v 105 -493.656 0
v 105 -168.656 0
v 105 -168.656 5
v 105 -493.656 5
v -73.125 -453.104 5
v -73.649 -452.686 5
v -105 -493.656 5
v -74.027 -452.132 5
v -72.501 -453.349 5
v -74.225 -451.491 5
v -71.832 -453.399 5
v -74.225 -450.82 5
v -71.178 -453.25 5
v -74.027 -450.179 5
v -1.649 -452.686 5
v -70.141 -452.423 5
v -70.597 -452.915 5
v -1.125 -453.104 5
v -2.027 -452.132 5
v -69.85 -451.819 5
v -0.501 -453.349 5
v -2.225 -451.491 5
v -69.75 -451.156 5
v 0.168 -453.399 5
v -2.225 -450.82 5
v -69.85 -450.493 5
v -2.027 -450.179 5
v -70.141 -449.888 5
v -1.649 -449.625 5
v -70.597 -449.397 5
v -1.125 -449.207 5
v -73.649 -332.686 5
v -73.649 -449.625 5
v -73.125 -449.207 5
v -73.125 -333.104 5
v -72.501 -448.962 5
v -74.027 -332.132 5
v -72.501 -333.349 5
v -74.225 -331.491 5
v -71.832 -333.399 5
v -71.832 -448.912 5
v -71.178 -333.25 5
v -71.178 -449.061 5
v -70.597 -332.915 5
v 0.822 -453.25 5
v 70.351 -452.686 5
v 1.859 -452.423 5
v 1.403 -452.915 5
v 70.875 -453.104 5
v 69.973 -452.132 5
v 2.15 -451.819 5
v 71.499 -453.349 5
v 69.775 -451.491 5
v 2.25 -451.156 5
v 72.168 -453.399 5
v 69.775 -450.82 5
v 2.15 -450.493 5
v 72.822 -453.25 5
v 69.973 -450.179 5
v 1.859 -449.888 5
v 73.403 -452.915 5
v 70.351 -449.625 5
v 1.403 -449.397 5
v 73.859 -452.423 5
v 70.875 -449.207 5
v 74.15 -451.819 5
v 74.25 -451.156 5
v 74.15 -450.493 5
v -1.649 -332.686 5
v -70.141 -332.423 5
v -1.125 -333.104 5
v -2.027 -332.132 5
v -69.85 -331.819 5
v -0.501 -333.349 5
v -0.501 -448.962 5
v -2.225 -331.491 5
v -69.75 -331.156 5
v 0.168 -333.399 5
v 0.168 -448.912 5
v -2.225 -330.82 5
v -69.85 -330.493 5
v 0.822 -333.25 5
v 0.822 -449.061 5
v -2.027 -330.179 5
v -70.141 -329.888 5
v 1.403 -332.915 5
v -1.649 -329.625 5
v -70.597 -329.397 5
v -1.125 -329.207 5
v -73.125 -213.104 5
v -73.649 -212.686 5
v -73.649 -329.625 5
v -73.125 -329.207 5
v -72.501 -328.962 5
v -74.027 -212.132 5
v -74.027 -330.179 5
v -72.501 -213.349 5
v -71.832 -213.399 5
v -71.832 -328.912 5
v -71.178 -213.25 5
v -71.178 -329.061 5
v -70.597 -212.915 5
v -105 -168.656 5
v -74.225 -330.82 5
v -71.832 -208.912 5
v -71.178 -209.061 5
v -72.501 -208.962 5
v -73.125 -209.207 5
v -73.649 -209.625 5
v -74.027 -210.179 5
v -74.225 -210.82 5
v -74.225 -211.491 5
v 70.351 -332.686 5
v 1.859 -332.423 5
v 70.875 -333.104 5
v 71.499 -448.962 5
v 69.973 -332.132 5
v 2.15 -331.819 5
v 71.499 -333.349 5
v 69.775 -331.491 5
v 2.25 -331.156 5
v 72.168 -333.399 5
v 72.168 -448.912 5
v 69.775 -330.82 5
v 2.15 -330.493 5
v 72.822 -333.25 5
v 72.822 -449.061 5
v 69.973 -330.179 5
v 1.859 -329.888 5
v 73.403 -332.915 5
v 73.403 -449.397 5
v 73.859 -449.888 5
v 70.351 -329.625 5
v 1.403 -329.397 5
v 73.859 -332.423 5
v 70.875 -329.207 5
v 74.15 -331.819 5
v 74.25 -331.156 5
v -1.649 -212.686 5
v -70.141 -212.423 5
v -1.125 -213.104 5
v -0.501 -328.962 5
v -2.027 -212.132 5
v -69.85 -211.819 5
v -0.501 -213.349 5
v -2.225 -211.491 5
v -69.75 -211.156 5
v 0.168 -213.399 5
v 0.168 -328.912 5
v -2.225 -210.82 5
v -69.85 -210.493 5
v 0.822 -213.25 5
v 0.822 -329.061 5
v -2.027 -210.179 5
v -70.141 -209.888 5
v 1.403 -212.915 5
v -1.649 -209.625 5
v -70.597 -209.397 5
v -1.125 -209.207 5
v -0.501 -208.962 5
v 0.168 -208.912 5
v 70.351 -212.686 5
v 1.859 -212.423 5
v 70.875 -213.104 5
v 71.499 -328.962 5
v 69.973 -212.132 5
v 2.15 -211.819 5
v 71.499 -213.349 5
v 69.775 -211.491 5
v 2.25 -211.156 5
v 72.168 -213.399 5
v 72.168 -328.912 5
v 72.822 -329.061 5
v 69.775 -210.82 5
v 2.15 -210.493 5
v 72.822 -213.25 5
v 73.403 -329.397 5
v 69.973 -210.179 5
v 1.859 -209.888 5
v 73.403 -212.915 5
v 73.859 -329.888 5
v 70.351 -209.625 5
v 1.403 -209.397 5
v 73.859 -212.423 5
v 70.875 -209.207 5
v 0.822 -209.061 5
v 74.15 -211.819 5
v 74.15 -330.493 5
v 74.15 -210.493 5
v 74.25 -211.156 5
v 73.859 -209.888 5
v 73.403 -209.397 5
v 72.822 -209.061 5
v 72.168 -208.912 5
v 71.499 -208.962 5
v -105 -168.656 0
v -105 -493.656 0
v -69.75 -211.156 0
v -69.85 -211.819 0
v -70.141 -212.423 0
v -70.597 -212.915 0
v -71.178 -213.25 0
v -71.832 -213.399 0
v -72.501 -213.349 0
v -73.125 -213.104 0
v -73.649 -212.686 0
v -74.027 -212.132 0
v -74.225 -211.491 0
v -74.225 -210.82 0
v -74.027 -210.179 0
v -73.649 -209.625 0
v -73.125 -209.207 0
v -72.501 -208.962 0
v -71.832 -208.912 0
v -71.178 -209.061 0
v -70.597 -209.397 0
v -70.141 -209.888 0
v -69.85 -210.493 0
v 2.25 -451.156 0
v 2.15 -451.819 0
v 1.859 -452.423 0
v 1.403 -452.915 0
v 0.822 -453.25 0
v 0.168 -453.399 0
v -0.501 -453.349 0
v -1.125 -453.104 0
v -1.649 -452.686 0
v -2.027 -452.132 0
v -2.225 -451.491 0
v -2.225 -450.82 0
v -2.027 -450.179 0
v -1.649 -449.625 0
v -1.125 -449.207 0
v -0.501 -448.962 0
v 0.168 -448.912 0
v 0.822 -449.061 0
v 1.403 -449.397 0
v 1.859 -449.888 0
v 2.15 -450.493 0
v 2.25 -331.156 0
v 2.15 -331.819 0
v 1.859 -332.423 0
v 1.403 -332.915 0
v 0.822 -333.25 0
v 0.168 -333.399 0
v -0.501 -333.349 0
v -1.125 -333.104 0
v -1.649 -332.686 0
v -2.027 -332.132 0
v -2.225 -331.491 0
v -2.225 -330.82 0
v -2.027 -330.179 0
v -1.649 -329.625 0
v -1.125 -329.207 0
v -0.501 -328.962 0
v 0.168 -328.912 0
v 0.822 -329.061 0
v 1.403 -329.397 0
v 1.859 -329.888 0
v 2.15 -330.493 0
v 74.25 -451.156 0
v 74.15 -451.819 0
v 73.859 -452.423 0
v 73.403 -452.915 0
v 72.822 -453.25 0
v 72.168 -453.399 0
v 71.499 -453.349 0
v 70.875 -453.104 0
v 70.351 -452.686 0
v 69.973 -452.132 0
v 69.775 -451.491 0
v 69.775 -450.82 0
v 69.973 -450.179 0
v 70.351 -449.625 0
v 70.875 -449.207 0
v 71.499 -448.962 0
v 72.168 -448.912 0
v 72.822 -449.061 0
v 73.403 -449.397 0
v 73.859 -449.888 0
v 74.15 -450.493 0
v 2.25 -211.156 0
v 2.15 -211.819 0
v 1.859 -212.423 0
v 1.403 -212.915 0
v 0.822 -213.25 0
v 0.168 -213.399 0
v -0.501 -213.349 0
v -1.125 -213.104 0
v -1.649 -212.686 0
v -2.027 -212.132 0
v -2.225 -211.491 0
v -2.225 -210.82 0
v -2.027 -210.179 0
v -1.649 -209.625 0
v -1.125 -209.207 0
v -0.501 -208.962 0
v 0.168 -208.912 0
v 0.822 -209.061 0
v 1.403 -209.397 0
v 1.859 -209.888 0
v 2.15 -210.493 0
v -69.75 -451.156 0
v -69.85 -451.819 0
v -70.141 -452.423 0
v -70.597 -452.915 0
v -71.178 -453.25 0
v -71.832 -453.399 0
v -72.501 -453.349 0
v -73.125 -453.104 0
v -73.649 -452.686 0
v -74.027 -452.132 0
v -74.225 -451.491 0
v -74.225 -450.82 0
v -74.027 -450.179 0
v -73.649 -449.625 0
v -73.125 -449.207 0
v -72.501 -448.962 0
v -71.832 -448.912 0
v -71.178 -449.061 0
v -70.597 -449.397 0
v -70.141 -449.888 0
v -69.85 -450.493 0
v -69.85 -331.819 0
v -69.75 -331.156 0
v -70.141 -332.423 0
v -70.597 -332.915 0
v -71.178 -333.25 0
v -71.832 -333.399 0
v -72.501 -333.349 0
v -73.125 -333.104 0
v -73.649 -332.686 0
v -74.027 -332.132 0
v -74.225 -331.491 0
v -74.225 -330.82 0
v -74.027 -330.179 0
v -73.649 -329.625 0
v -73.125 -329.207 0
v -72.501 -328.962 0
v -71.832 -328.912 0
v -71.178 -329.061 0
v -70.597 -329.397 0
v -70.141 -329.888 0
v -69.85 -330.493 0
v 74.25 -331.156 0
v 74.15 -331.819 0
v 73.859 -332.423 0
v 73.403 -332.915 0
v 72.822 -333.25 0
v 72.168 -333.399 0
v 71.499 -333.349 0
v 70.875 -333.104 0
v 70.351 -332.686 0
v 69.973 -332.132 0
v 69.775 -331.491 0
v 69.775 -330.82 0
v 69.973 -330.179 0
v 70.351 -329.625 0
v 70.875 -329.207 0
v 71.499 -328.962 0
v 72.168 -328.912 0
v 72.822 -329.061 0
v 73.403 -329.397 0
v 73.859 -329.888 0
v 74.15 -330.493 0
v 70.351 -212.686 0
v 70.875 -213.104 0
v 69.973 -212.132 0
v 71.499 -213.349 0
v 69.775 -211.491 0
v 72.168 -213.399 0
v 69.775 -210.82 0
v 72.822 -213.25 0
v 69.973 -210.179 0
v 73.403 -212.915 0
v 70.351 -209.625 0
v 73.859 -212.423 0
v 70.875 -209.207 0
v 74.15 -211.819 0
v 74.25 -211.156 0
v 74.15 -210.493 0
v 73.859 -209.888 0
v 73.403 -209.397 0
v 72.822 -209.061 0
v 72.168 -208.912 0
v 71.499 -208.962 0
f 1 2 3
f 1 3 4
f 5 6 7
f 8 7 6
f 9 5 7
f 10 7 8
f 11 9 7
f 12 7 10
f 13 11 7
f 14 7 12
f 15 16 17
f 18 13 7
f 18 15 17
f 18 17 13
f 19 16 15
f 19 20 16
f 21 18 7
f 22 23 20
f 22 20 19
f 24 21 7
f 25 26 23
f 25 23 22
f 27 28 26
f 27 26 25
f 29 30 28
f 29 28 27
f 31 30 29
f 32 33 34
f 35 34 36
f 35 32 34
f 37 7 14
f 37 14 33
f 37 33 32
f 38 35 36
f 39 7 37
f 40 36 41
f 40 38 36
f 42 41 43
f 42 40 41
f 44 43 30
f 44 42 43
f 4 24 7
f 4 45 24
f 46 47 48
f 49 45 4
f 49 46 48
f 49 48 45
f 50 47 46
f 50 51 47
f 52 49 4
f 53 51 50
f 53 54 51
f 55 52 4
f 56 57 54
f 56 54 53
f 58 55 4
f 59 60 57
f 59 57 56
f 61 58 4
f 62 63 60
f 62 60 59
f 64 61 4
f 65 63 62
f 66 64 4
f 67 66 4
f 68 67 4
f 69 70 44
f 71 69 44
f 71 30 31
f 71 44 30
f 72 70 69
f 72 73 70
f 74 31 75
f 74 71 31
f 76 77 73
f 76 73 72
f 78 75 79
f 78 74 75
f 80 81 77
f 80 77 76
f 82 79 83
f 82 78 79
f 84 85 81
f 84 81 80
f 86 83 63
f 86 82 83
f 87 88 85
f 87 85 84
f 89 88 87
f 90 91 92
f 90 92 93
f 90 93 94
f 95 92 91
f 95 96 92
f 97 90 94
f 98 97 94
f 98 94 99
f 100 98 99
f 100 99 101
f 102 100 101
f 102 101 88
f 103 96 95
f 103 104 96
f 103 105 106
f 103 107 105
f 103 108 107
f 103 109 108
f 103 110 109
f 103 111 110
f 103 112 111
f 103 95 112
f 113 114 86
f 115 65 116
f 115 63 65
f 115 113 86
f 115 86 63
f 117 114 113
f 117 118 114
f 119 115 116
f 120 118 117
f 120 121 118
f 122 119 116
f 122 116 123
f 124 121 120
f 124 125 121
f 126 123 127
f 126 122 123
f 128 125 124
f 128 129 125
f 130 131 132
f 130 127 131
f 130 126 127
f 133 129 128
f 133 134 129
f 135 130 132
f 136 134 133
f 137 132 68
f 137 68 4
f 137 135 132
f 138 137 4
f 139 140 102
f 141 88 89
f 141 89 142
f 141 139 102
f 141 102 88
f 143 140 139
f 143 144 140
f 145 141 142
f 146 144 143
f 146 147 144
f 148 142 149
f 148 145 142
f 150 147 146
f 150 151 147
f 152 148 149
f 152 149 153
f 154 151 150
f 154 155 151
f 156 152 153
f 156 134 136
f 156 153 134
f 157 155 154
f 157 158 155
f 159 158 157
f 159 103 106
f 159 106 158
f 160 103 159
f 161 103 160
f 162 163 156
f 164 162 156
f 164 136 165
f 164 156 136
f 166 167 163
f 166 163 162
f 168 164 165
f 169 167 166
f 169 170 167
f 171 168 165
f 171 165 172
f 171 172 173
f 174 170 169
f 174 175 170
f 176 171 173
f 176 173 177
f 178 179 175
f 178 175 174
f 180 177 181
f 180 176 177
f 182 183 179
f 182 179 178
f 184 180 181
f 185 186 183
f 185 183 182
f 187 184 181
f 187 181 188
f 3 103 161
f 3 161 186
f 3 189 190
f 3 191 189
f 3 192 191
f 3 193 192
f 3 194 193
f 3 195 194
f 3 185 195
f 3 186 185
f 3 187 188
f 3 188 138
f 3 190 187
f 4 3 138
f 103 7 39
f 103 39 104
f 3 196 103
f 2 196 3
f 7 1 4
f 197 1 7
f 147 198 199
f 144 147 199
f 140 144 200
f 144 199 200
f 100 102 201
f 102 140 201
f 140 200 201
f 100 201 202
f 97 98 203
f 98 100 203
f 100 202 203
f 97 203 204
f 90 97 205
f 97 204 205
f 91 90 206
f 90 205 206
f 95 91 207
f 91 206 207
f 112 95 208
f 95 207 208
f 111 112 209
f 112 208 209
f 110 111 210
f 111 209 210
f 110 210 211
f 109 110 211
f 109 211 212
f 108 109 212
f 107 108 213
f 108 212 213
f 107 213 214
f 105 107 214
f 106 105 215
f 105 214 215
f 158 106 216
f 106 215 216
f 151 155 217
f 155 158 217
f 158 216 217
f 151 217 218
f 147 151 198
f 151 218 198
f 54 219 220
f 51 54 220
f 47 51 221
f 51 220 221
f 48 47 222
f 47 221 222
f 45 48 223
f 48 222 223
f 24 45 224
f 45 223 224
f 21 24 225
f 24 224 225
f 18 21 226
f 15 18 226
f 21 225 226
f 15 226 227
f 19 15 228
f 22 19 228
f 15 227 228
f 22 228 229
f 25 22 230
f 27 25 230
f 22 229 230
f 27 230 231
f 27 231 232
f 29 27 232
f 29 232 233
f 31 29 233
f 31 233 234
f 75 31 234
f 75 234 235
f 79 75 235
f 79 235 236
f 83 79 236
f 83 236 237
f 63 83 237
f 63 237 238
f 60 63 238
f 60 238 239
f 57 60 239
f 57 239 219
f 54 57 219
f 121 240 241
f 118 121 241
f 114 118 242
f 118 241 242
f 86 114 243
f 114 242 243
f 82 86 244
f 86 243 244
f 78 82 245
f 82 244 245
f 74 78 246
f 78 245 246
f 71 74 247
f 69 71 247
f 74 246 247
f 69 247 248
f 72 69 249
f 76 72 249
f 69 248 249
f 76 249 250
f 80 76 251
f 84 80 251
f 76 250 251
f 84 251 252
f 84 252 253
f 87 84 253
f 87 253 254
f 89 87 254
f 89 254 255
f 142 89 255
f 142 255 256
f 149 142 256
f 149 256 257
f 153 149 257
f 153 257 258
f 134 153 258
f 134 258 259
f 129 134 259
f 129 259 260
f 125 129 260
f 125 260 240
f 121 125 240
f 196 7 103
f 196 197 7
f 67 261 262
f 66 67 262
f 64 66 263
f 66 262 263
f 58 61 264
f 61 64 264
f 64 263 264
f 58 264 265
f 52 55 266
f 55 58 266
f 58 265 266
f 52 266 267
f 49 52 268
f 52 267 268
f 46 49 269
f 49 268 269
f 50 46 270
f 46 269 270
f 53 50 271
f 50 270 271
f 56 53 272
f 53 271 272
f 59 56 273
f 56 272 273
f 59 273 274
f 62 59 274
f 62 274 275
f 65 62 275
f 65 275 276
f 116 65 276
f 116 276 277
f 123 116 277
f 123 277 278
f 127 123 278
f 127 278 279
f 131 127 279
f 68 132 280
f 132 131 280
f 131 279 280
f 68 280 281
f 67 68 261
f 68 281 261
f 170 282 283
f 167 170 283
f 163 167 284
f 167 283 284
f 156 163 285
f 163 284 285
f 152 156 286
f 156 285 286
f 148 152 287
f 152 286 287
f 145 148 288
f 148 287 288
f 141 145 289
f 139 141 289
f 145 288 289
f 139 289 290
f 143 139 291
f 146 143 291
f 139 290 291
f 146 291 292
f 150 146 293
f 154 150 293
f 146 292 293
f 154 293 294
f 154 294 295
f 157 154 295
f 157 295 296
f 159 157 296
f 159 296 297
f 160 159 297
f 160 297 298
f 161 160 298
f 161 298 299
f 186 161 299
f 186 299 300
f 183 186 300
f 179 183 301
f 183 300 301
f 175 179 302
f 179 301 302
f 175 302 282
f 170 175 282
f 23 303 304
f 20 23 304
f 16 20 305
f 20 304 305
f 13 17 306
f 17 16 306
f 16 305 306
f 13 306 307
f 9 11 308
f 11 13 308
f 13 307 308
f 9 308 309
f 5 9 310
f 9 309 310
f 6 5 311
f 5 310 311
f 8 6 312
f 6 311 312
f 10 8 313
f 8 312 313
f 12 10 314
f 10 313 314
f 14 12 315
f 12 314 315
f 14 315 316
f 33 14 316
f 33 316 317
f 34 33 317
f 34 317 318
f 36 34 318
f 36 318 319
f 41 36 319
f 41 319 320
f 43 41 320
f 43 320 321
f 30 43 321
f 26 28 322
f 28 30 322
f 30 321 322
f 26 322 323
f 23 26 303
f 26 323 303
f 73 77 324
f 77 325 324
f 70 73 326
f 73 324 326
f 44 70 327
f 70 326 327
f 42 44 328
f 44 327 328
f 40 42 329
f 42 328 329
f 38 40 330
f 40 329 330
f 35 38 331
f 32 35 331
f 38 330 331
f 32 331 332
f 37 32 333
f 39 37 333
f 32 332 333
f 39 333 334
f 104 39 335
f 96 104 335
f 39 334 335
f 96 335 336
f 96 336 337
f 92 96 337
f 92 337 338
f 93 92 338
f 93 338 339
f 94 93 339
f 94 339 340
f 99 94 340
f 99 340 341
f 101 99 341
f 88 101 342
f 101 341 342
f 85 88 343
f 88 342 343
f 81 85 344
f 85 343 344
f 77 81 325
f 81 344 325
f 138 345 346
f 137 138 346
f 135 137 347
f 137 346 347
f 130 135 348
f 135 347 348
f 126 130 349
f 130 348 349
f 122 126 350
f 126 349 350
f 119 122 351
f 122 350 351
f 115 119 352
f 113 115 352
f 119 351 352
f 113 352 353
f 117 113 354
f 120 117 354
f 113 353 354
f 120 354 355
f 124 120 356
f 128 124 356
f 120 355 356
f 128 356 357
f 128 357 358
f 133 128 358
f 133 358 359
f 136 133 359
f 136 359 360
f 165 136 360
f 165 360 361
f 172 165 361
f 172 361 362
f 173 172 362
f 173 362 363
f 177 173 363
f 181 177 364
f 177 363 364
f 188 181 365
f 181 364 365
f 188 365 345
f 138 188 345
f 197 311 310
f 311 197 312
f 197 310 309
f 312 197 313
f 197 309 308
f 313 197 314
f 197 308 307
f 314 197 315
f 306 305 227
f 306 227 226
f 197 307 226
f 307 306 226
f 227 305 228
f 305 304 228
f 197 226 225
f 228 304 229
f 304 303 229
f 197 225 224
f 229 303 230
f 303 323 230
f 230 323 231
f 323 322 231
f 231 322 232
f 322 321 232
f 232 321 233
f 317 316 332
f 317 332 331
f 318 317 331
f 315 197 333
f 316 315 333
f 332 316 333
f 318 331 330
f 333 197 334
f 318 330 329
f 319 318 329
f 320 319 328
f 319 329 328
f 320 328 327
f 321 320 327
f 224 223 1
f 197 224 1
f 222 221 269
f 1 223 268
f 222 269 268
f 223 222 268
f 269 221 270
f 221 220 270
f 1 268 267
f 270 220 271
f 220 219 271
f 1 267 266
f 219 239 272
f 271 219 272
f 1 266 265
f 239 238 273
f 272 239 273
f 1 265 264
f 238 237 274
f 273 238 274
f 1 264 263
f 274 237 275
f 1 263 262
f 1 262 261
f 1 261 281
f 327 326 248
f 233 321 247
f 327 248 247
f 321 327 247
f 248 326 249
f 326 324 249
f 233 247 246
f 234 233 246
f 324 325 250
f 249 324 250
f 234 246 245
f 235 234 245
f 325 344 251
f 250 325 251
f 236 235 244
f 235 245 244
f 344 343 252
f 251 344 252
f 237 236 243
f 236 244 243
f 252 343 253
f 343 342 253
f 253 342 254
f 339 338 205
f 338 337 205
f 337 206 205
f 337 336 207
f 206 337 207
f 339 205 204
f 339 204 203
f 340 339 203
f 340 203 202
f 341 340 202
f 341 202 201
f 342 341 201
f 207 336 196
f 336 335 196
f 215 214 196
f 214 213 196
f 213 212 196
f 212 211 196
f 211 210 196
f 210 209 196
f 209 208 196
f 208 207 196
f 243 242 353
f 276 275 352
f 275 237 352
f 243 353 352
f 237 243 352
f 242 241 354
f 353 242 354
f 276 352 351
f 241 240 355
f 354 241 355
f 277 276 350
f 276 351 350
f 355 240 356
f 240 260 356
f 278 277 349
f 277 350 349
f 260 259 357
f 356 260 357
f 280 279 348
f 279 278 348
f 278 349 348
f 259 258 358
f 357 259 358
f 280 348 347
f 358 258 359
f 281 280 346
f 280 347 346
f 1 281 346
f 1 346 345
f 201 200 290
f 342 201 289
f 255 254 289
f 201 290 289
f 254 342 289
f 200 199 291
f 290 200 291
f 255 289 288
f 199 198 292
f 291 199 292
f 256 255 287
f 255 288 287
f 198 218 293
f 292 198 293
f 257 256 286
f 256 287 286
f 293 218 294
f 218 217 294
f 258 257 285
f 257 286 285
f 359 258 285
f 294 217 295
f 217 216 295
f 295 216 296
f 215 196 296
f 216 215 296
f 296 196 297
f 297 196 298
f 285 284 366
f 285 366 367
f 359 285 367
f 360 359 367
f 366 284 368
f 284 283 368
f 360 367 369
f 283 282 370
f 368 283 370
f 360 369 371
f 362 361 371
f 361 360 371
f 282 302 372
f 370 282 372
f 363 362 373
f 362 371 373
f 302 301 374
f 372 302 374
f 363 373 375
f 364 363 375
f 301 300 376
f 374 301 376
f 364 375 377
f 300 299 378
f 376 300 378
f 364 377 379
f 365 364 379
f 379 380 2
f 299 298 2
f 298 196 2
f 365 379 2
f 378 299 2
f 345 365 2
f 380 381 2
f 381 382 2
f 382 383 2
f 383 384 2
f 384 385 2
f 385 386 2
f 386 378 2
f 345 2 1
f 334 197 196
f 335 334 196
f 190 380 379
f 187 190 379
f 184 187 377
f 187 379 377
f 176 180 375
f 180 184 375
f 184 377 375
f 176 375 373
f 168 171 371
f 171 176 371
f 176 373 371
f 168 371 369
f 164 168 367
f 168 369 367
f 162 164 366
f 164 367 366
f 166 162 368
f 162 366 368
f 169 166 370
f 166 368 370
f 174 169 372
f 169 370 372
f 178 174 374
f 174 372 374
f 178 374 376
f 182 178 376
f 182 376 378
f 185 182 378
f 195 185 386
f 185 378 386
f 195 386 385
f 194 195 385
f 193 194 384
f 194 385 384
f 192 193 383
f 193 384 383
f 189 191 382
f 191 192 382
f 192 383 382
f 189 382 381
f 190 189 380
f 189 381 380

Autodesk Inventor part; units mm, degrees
ref_plane "YZ Plane" through (0, 0, 0) normal (1, 0, 0) x (0, 1, 0)
ref_plane "XZ Plane" through (0, 0, 0) normal (0, 1, 0) x (-1, 0, 0)
ref_plane "XY Plane" through (0, 0, 0) normal (0, 0, 1) x (1, 0, 0)
ref_plane "作業平面1" through (0, 0, 0) normal (0, 0, 1) x (1, 0, 0)
sketch "スケッチ1" plane through (0, 0, 0) normal (0, 0, 1) x (1, 0, 0)
  line L0 (0, -891.1557) -> (0, 228.8443)
  line L1 (-147, -331.1557) -> (147, -331.1557)
  circle A0 centre (72, -331.1557) radius 2.25 projected
  circle A1 centre (-72, -211.1557) radius 2.25 projected
  circle A2 centre (0, -451.1557) radius 2.25 projected
  circle A3 centre (-72, -331.1557) radius 2.25 projected
  circle A4 centre (0, -331.1557) radius 2.25 projected
  circle A5 centre (-72, -451.1557) radius 2.25 projected
  circle A6 centre (0, -211.1557) radius 2.25 projected
  circle A7 centre (72, -451.1557) radius 2.25 projected
  circle A8 centre (72, -211.1557) radius 2.25 projected
  circle A9 centre (20.5, -135.3359) radius 2.75 projected
  circle A10 centre (20.5, -72.3359) radius 2.75 projected
  circle A11 centre (-20.5, -585.3359) radius 2.75 projected
  circle A12 centre (20.5, -522.3359) radius 2.75 projected
  circle A13 centre (-20.5, -522.3359) radius 2.75 projected
  circle A14 centre (20.5, -585.3359) radius 2.75 projected
  circle A15 centre (-20.5, -72.3359) radius 2.75 projected
  circle A16 centre (-20.5, -135.3359) radius 2.75 projected
  arc A17 (105, -36.1557) -> (-105, -36.1557) centre (0, -36.1557) ccw projected
  line L2 (-105, -626.1557) -> (-105, -36.1557) projected
  arc A18 (-105, -626.1557) -> (105, -626.1557) centre (0, -626.1557) ccw projected
  line L3 (105, -36.1557) -> (105, -626.1557) projected
  line L4 (105, -493.6557) -> (-105, -493.6557)
  line L5 (-105, -493.6557) -> (-105, -168.6557)
  line L6 (-105, -168.6557) -> (105, -168.6557)
  line L7 (105, -168.6557) -> (105, -493.6557)
  line L8 (105, -493.6557) -> (-105, -168.6557) construction
  line L9 (-105, -493.6557) -> (105, -168.6557) construction
  point P0 (0, 0)
  dimension "d0" = 325
extrude "押し出し1" add sketch "スケッチ1" along normal blind 5 contours L4 L2 L1 A3 A4 L0 A2 | L0 A2 A4 L1 A0 L3 L4 | L1 A0 A4 L0 A6 L6 L3 | L2 L6 L0 A6 A4 L1 A3
properties part number "components_board"
